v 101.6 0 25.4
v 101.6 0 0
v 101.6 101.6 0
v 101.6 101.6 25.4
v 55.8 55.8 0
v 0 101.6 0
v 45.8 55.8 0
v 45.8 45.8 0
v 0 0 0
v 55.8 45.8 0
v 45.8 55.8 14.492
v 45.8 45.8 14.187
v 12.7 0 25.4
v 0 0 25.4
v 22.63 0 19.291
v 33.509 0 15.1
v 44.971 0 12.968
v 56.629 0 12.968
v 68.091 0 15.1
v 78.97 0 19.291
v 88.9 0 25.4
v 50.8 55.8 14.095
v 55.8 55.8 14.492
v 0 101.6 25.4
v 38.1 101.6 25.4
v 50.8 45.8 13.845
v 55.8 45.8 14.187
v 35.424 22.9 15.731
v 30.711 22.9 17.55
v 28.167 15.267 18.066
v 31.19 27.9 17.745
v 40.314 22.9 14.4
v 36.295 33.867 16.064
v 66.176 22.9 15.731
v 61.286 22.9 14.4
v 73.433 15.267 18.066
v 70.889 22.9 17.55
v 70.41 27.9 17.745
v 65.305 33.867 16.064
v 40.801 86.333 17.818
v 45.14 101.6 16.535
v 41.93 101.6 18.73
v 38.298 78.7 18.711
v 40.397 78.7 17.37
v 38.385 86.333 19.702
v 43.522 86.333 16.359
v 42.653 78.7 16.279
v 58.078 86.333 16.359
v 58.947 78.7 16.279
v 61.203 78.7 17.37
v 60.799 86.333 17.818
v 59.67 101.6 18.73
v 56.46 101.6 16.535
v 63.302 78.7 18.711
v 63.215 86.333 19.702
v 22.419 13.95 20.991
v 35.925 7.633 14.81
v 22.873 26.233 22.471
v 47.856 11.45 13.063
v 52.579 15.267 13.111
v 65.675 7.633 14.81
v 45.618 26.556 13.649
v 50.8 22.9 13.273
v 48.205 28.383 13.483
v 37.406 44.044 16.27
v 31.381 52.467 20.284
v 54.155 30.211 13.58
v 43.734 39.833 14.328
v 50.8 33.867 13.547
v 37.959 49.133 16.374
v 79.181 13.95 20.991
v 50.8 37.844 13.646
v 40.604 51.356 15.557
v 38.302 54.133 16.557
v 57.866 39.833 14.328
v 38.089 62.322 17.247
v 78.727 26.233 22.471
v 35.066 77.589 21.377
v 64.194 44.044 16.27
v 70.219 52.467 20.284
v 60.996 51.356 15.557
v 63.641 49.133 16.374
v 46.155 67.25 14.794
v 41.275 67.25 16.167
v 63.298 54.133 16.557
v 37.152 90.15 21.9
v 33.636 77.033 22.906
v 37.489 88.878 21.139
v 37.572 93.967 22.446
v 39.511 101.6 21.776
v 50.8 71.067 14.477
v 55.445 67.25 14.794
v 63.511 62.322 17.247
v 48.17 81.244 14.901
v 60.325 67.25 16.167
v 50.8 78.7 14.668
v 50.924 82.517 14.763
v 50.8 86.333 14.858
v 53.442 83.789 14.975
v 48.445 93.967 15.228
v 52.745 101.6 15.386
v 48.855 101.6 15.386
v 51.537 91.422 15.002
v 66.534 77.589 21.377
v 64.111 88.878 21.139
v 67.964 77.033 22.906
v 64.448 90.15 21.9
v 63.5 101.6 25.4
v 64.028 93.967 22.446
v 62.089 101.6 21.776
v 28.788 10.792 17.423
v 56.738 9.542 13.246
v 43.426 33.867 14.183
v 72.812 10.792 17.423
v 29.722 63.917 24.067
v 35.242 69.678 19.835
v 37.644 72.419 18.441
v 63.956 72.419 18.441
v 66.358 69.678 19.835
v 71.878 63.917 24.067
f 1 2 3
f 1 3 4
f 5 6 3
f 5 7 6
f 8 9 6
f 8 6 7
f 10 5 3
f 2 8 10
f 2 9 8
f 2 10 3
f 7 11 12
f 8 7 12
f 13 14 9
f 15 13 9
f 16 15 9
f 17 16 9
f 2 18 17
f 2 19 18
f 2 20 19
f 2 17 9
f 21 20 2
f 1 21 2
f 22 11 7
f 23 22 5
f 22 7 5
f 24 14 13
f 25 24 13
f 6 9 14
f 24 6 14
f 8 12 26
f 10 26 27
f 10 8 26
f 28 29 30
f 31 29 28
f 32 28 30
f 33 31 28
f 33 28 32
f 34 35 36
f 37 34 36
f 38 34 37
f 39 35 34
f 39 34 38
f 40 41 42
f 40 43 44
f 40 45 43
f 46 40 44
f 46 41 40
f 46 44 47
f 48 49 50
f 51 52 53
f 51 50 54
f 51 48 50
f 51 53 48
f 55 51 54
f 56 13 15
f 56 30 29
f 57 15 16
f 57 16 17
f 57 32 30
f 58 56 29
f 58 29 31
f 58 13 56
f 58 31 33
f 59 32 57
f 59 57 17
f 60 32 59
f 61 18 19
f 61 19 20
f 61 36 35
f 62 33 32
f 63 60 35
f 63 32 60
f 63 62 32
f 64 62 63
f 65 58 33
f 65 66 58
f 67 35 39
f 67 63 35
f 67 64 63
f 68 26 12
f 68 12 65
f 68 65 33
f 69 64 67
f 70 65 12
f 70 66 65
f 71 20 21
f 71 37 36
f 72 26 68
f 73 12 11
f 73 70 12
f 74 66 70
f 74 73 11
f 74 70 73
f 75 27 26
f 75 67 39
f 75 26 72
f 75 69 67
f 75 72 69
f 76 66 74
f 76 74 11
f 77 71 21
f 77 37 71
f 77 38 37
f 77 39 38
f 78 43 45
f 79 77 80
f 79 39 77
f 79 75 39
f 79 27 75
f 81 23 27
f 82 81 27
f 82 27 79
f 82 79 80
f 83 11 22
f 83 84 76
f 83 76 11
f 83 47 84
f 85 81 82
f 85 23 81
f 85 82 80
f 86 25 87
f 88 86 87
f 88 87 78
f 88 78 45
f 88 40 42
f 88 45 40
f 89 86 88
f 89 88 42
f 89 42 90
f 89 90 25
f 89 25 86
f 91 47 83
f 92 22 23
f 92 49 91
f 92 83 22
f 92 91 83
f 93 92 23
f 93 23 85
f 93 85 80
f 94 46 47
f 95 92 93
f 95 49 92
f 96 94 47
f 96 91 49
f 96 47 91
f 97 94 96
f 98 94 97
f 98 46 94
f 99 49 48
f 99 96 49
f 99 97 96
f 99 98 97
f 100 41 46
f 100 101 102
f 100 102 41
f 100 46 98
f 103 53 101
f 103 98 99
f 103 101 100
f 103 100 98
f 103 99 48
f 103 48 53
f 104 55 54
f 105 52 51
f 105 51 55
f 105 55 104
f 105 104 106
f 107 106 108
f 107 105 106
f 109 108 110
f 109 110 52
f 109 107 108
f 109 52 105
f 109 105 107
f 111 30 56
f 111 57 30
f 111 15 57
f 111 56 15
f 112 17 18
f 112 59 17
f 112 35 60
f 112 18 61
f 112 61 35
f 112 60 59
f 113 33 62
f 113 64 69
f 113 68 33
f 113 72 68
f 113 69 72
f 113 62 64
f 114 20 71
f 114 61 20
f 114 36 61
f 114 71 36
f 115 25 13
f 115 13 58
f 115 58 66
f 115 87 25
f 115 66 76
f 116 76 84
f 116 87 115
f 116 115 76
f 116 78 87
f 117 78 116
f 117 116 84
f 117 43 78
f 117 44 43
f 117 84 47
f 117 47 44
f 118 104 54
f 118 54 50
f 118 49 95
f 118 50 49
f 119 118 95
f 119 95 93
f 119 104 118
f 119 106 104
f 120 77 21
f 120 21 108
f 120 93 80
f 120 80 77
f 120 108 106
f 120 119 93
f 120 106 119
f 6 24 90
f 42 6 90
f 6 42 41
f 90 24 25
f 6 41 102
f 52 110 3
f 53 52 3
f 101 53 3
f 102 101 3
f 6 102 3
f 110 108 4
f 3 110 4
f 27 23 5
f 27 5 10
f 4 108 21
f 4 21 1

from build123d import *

# Parameters (mm, degrees)
F0_W     = 101.6
F0_H     = 25.4
F1_DEPTH = 101.6
F5_W     = 10
F5_H     = 10
F6_DEPTH = 25.401


with BuildPart() as f1:
    # F0 (on Front) → F1 (new body)
    with BuildSketch(Plane.XZ):
        with Locations((50.8, 12.7)):
            Rectangle(F0_W, F0_H)
    extrude(amount=-F1_DEPTH)

    # F2 (on face) → F4 section 0
    with BuildSketch(Plane.XZ):
        with BuildLine():
            Line((88.9, 25.4), (12.7, 25.4))
            ThreePointArc((12.7, 25.4), (50.8, 12.7), (88.9, 25.4))
        make_face()
    # F3 (on face) → F4 section 1
    with BuildSketch(Plane(origin=(0, 101.6, 0), x_dir=(-1, 0, 0), z_dir=(0, 1, 0))):
        with BuildLine():
            Line((-38.1, 25.4), (-63.5, 25.4))
            ThreePointArc((-63.5, 25.4), (-50.8, 15.24), (-38.1, 25.4))
        make_face()
    loft(mode=Mode.SUBTRACT)

    # F5 (on face) → F6 (cut, through all)
    with BuildSketch(Plane(origin=(0, 0, 0), x_dir=(1, 0, 0), z_dir=(0, 0, -1))):
        with Locations((50.8, -50.8)):
            Rectangle(F5_W, F5_H)
    extrude(amount=-F6_DEPTH, mode=Mode.SUBTRACT)


solid = f1.part
